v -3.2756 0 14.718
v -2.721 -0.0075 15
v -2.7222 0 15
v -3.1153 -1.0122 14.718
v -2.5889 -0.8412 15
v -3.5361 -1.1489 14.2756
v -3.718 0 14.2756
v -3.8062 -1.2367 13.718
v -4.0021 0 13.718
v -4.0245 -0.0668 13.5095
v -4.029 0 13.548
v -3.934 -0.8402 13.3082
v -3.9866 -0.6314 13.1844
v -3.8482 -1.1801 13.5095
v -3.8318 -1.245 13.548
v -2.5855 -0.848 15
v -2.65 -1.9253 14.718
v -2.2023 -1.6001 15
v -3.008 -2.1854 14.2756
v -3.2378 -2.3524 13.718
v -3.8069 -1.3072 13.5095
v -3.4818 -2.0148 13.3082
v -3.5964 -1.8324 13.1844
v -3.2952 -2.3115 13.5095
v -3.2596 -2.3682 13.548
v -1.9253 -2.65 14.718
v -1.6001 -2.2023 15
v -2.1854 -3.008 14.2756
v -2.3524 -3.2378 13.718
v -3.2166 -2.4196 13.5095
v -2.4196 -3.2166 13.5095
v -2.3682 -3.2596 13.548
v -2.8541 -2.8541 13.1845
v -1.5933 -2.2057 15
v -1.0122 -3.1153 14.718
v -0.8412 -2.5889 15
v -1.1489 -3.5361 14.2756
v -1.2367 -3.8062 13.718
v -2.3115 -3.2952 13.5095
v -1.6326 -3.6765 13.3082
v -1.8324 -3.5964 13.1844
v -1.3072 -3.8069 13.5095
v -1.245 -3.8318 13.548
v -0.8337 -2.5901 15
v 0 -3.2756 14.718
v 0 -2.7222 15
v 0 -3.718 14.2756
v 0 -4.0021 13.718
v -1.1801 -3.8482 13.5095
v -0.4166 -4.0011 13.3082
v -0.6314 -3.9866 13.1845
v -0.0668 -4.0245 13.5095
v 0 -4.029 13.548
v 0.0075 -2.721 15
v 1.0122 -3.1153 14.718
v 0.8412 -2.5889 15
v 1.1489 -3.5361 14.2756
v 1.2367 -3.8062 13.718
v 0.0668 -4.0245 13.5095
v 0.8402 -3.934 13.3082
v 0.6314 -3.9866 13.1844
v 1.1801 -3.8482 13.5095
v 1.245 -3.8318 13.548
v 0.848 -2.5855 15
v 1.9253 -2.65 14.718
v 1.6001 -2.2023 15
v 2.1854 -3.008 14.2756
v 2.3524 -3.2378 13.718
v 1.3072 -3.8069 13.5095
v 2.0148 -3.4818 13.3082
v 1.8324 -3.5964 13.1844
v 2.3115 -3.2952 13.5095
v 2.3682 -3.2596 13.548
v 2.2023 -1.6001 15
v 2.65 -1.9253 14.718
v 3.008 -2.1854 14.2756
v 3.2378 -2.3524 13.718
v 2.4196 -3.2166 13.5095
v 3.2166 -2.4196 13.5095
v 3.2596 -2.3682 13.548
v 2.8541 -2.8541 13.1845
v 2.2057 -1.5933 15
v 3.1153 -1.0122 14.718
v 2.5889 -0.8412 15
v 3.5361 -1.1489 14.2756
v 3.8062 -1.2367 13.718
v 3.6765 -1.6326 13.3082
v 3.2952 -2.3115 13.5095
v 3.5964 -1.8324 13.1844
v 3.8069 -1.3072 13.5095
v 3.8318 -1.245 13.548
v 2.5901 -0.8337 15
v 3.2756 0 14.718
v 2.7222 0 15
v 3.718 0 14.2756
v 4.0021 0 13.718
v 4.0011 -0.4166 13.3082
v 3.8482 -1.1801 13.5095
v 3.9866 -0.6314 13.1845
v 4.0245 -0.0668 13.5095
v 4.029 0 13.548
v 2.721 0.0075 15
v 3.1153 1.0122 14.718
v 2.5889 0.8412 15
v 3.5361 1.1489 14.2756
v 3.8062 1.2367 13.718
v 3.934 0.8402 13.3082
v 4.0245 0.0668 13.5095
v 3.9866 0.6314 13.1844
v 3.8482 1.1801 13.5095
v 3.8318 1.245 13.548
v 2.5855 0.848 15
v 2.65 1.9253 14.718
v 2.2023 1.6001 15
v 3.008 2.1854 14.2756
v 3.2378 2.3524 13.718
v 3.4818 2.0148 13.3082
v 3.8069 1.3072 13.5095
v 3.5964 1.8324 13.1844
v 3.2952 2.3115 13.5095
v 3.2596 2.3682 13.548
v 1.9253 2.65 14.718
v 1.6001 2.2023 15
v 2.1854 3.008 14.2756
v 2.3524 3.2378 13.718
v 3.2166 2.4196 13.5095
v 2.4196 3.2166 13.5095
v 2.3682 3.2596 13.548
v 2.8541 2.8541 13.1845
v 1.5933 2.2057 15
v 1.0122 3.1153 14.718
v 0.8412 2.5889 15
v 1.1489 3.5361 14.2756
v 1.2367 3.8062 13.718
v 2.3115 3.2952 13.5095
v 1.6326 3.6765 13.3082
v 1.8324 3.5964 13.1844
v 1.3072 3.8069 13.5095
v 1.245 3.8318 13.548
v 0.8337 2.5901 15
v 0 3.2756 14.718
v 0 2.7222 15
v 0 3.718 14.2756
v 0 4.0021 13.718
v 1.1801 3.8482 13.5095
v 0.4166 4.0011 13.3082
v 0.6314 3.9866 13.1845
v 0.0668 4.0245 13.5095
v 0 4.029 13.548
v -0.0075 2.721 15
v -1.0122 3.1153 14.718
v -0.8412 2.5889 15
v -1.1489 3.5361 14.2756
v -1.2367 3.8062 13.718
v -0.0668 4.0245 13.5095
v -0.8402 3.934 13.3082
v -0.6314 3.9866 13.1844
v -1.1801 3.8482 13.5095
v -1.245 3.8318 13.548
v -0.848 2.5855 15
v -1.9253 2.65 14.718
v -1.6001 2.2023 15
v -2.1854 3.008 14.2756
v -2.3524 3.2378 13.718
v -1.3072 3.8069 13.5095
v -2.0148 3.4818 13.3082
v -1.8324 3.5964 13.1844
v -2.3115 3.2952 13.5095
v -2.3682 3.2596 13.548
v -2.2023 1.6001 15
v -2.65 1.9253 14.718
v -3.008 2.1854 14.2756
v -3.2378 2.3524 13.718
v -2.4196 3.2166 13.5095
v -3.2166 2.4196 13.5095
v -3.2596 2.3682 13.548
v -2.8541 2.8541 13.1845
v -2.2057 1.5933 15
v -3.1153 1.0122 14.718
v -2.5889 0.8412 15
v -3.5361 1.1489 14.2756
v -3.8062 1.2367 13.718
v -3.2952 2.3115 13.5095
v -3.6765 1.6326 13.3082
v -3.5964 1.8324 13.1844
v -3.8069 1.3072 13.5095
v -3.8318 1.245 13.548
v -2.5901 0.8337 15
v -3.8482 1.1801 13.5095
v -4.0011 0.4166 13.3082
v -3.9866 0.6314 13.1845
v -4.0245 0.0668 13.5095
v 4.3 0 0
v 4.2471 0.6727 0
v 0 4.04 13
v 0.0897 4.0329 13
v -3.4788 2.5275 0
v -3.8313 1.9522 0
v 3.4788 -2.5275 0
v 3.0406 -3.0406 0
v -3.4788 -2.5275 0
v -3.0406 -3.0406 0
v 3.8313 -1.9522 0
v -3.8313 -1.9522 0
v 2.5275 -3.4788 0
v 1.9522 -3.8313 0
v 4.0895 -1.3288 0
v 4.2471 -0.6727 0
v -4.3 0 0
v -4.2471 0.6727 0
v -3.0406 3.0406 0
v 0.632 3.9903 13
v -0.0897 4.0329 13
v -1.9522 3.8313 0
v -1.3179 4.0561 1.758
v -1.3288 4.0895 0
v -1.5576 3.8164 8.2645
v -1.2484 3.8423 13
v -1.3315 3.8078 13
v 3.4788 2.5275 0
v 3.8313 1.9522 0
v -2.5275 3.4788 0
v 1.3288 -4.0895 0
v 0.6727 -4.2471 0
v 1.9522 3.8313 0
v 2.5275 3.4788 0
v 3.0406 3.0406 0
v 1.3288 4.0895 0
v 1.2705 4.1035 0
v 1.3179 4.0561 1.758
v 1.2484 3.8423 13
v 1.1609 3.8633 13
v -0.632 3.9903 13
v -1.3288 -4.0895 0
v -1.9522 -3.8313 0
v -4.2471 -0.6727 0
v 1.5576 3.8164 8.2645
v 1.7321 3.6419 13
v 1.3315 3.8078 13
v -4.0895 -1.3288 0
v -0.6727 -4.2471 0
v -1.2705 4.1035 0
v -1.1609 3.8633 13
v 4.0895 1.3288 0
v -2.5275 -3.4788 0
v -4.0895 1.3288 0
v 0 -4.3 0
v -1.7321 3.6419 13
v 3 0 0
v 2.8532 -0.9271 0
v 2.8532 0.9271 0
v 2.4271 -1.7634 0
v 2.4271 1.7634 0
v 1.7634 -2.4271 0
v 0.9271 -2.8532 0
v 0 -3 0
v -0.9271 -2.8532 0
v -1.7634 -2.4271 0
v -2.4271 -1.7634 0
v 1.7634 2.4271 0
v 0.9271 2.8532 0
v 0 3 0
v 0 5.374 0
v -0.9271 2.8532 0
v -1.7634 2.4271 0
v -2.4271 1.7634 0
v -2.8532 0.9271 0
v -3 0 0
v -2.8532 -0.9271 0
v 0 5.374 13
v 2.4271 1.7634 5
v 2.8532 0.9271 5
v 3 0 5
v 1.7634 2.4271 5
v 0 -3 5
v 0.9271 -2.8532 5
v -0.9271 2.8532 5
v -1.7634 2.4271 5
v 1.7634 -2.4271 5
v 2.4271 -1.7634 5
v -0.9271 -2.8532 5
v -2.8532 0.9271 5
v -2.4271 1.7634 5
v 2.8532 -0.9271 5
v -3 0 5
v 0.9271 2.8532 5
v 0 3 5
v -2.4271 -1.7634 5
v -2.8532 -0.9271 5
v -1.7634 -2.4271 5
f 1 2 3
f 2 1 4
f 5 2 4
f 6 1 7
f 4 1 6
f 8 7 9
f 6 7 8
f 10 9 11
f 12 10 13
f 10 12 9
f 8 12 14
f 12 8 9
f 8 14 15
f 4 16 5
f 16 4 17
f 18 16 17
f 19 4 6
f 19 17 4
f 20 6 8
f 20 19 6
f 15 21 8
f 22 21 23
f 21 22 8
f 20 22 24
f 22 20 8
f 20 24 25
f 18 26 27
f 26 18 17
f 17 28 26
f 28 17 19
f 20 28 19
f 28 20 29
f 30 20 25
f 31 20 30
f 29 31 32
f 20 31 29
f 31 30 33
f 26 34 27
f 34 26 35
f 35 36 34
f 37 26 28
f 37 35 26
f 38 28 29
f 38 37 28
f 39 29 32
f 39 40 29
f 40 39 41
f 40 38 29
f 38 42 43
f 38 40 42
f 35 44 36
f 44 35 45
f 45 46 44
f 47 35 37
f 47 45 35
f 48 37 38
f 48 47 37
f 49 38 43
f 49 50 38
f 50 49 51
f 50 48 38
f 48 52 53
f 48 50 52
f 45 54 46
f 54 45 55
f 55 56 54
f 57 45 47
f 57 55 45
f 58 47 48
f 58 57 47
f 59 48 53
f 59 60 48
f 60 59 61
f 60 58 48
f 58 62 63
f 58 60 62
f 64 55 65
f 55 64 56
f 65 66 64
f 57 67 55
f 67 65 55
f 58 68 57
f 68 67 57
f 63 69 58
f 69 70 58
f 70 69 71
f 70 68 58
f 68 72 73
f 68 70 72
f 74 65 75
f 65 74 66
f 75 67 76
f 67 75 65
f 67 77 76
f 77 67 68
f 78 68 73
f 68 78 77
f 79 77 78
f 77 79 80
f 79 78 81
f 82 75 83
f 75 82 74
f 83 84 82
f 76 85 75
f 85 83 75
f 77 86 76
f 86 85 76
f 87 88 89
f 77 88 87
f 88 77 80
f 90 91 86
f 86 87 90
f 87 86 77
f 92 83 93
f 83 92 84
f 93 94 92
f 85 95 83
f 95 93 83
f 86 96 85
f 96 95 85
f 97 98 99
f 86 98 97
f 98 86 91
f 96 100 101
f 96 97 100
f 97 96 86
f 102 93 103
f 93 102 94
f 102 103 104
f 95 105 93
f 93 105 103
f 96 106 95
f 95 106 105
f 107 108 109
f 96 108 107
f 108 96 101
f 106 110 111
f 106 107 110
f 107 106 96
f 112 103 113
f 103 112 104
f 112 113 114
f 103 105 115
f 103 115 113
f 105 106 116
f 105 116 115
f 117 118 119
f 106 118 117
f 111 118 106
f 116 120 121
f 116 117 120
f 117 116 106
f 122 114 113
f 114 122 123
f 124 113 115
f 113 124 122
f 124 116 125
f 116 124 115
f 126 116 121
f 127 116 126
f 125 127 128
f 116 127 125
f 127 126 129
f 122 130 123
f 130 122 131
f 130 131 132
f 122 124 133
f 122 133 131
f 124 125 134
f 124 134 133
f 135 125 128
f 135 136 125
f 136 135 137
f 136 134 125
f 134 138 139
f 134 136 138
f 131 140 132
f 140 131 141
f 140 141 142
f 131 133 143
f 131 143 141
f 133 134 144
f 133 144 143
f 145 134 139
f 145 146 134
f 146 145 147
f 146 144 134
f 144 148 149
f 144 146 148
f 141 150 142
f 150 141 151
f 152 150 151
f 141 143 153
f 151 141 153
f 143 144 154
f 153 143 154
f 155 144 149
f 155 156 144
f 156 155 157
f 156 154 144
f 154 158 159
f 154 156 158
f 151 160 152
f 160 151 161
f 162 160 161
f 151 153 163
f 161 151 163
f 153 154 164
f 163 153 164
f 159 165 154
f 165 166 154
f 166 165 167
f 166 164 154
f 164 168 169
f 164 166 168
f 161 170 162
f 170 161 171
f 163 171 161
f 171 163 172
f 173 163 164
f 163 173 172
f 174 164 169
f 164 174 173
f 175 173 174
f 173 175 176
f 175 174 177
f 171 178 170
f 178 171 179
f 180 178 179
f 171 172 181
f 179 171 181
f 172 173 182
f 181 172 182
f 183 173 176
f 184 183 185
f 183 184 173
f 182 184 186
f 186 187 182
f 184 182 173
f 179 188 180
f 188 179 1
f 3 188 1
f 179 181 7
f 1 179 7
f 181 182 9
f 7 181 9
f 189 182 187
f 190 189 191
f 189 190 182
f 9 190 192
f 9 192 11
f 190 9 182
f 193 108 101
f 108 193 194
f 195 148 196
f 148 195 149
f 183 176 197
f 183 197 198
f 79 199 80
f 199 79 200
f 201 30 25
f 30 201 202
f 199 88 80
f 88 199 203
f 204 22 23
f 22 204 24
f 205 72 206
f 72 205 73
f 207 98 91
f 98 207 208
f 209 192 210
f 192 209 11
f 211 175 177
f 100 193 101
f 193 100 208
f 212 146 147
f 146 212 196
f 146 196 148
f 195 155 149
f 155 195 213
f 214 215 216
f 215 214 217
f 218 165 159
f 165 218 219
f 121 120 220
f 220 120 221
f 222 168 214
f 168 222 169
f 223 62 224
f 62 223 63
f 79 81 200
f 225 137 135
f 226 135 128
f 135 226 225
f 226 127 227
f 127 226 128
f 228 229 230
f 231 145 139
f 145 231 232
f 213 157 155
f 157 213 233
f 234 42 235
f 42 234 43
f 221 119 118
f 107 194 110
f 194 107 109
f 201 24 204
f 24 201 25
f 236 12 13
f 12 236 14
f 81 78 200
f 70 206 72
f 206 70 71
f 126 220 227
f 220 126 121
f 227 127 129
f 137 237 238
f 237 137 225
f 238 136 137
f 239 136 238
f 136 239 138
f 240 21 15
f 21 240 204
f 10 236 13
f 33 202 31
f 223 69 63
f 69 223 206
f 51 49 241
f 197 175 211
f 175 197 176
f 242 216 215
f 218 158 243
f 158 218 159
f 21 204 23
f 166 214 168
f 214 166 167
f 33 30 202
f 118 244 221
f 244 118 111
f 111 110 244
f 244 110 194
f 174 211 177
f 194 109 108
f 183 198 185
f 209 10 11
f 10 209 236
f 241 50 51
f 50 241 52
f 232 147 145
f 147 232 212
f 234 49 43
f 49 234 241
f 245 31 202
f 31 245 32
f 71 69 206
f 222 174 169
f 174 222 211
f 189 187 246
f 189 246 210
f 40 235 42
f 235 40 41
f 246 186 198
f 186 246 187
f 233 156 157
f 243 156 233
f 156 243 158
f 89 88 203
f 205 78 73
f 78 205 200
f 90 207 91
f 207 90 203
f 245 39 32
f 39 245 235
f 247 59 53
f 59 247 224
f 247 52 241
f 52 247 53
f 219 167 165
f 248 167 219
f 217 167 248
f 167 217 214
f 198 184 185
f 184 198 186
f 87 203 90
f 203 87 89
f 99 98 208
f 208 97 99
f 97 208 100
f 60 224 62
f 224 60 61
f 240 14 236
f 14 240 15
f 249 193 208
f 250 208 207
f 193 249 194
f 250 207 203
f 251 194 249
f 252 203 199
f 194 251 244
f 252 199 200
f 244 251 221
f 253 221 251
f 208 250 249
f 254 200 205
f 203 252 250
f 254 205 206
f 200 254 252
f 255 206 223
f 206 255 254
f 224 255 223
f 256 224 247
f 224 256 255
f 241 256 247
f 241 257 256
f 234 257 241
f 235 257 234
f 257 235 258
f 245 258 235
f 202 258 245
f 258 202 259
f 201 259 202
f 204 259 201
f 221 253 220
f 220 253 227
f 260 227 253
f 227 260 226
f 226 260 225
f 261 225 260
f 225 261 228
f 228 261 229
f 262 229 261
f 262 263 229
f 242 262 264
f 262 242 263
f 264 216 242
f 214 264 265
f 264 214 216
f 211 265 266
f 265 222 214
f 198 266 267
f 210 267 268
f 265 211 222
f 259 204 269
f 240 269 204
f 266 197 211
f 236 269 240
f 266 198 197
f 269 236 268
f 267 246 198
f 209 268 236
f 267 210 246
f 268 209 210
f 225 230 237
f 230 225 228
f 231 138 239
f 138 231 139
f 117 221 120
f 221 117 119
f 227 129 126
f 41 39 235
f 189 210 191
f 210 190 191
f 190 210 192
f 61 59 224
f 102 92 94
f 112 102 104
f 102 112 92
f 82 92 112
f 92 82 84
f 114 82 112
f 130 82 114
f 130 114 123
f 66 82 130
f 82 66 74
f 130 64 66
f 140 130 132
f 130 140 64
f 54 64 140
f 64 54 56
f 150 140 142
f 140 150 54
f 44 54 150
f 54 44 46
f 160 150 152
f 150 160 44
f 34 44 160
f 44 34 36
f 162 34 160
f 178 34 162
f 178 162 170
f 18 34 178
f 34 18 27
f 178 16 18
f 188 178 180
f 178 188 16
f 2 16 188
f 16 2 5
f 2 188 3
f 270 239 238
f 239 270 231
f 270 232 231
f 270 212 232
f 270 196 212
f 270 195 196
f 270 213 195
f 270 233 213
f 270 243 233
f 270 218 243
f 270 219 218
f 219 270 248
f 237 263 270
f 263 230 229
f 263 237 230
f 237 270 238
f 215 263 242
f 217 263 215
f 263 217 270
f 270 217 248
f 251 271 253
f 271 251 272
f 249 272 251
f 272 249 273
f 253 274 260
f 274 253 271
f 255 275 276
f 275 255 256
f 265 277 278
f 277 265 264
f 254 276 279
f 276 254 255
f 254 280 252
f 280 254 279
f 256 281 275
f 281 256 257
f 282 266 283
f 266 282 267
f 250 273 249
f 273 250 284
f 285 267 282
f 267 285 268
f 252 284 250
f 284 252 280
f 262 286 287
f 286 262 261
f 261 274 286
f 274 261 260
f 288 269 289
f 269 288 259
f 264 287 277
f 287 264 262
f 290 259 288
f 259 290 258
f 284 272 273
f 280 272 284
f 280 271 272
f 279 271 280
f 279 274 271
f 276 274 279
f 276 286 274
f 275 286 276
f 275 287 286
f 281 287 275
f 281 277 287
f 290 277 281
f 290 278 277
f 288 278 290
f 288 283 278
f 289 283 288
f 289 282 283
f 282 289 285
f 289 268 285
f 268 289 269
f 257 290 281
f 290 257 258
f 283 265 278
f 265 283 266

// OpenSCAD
/*

Parametric Potentiometer Knob Generator
version 1.1
2012 Steve Cooley
http://sc-fa.com
http://beatseqr.com
http://hapticsynapses.com

parametric potentiometer knob generator by steve cooley is licensed under a Creative Commons Attribution-NonCommercial-ShareAlike 3.0 Unported License. Based on a work at sc-fa.com. Permissions beyond the scope of this license may be available at http://sc-fa.com/blog/contact.

view terms of the license here:
http://creativecommons.org/licenses/by-nc-sa/3.0/


version history
---------------
1.1 2012-04-12 fixed the arrow indicator code to be more robust and easier to adjust parameters for.
1.0 2012-03-?? initial release.


*/


//
//
// Physical attributes, basic
//
//

knob_radius_top = 4;
knob_radius_bottom = 4.3;
knob_height = 15;
knob_smoothness = 40;

shaft_radius = 3.0;
shaft_height = 6;
shaft_smoothness = 20;

shaft_is_flatted = false;
flat_size_adjustment = -0.0;
// you won't need to mess with this. less than 5 makes it disappear. you can, however,
// set the adjustment to be a negative decimal if you need a flat but not as big as the default.
// go positive if you need a bigger flat
flat_size = 5 + flat_size_adjustment;

// some potentiometers need to have their knobs affixed with a set screw.
set_screw = false;
set_screw_radius = 1.5;
set_screw_depth = 9;
set_screw_height = 4;
quality_of_set_screw = 20;

//
//
// Decorations
//
//

//
// top edge smoothing
// thanks to http://www.iheartrobotics.com/ for the articles!
//

smoothing = true;
smoothing_radius = 2;				// tweak on this one, how much smoothing to apply
smooth = 20;						// tweak on this one, Number of facets of rounding cylinder

ct = -0.1; 							// circle translate? not sure.
circle_radius = knob_radius_top;  	// just match the top edge radius
circle_height = 1; 					// actually.. I don't know what this does.
pad = 0.2;							// Padding to maintain manifold


//
// directional indicators
//

// this is a corner edge of a cube sticking out of the cylinder at the bottom
// you can use it instead of the arrow shaped cutout in the top if you like. Or both.

pointy_external_indicator = true;
pointy_external_indicator_height = 13;
pointy_external_indicator_pokey_outey_ness = 0.7; //
pokey_outey_value = pointy_external_indicator_pokey_outey_ness - 1 - pad;
pokey_outey = [pokey_outey_value, pokey_outey_value,0];

// there's an arrow shaped hole you can have. There aren't a lot of controls for this.
// please feel free to improve on this script here.

arrow_indicator = false;
arrow_indicator_scale = 0.4;
arrow_indicator_translate = [0,1,16];
arrow_scale_head = 2;
arrow_scale_shaft = 1.5;

//
// indentations
//

// for spherical indentations, set the quantity, quality, size, and adjust the placement
indentations_sphere = false;
sphere_number_of_indentations = 12;
sphere_quality_of_indentations = 4;
size_of_sphere_indentations = 4;
// the first number in this set moves the spheres in or out. smaller is closer to the middle
// the second number in this set moves the spheres left or right
// the third number in this set moves the speheres up or down
translation_of_sphere_indentations = [10,0,15];
// in case you are using an odd number of indentations, you way want to adjust the starting angle
// so that they align to the front or set screw locations.
sphere_starting_rotation = 90;

// for cylinder indentations, set quantity, quality, radius, height, and placement
indentations_cylinder = false;
cylinder_number_of_indentations = 10;
cylinder_quality_of_indentations = 50;
radius_of_cylinder_indentations_top = 3;
radius_of_cylinder_indentations_bottom = 5;
height_of_cylinder_indentations = 12;
translation_of_cylinder_indentations = [0,8,-8];
cylinder_starting_rotation = -33.3;

// these are some setup variables... you probably won't need to mess with them.
negative_knob_radius = knob_radius_bottom*-1;


// this is the main module. It calls the submodules.
make_the_knob();

module make_the_knob()
{
	difference()
		{
		difference()
			{

			difference()
				{
				difference()
					{

					union()
						{

						difference()
							{
							// main cylinder
							cylinder(r1=knob_radius_bottom,r2=knob_radius_top,h=knob_height, $fn=knob_smoothness);

							smoothing();

							}

						external_direction_indicator();
						}

					shaft_hole();
					}

				set_screw_hole();
				}

			arrow_indicator();
			indentations();
		}
	}

}

module smoothing() {

// smoothing the top
				if(smoothing == true)
					{
						translate([0,0,knob_height])
						rotate([180,0,0])
						difference() {
							rotate_extrude(convexity=10,  $fn = smooth)
							translate([circle_radius-ct-smoothing_radius+pad,ct-pad,0])
							square(smoothing_radius+pad,smoothing_radius+pad);

							rotate_extrude(convexity=10,  $fn = smooth)
							translate([circle_radius-ct-smoothing_radius,ct+smoothing_radius,0])
							circle(r=smoothing_radius,$fn=smooth);
							}
					}
}

module external_direction_indicator() {

				if(pointy_external_indicator == true)
						{


						// outer pointy indicator
						rotate([0,0,45])
						translate(pokey_outey)
						// cube size of 8 minimum to point out
						cube(size=[knob_radius_bottom,knob_radius_bottom,pointy_external_indicator_height],center=false);
						}

}

module shaft_hole() {
				// shaft hole
				difference()
					{

					// round shaft hole
					translate([ 0, 0, -1 ])
					cylinder(r=shaft_radius,h=shaft_height, $fn=shaft_smoothness);

					if(shaft_is_flatted == true)
						{
						// D shaft shape for shaft cutout
						rotate( [0,0,90])
						translate([-7.5,-5,0])
						cube(size=[flat_size,10,13],center=false);
						}
					}
}


module set_screw_hole() {

			if(set_screw == true)
				{
				// set screw hole
				rotate ([90,0,0])
				translate([ 0, set_screw_height, 1 ])
				cylinder(r=set_screw_radius,h=set_screw_depth, $fn=quality_of_set_screw);
				}
}

module arrow_indicator() {
		if(arrow_indicator == true)
			{
			translate(arrow_indicator_translate)
			// begin arrow top cutout
			// translate([(knob_radius/2),knob_height,knob_height])
			rotate([90,0,45])
			scale([arrow_indicator_scale*.3,arrow_indicator_scale*.3,arrow_indicator_scale*.3])
			union()
				{
				rotate([90,45,0])
				scale([arrow_scale_head,arrow_scale_head,1])
				cylinder(r=8, h=10, $fn=3, center=true);
				rotate([90,45,0])
				translate([-10,0,0])
				scale([arrow_scale_shaft,arrow_scale_shaft,1])
				cube(size=[15,10,10],center=true);
				}
			}
}

module indentations() {

if(indentations_sphere == true)
			{
			for (z = [0:sphere_number_of_indentations])
				{
				rotate([0,0,sphere_starting_rotation+((360/sphere_number_of_indentations)*z)])
				translate(translation_of_sphere_indentations)
				sphere(size_of_sphere_indentations, $fn=sphere_quality_of_indentations);
				}
			}
if(indentations_cylinder == true)
			{
			for (z = [0:cylinder_number_of_indentations])
				{
				rotate([0,0,cylinder_starting_rotation+((360/cylinder_number_of_indentations)*z)])

				translate([negative_knob_radius,0,knob_height])
				translate(translation_of_cylinder_indentations)
				cylinder(r1=radius_of_cylinder_indentations_bottom, r2=radius_of_cylinder_indentations_top, h=height_of_cylinder_indentations, center=true, $fn=cylinder_quality_of_indentations);
				}
			}
		}
